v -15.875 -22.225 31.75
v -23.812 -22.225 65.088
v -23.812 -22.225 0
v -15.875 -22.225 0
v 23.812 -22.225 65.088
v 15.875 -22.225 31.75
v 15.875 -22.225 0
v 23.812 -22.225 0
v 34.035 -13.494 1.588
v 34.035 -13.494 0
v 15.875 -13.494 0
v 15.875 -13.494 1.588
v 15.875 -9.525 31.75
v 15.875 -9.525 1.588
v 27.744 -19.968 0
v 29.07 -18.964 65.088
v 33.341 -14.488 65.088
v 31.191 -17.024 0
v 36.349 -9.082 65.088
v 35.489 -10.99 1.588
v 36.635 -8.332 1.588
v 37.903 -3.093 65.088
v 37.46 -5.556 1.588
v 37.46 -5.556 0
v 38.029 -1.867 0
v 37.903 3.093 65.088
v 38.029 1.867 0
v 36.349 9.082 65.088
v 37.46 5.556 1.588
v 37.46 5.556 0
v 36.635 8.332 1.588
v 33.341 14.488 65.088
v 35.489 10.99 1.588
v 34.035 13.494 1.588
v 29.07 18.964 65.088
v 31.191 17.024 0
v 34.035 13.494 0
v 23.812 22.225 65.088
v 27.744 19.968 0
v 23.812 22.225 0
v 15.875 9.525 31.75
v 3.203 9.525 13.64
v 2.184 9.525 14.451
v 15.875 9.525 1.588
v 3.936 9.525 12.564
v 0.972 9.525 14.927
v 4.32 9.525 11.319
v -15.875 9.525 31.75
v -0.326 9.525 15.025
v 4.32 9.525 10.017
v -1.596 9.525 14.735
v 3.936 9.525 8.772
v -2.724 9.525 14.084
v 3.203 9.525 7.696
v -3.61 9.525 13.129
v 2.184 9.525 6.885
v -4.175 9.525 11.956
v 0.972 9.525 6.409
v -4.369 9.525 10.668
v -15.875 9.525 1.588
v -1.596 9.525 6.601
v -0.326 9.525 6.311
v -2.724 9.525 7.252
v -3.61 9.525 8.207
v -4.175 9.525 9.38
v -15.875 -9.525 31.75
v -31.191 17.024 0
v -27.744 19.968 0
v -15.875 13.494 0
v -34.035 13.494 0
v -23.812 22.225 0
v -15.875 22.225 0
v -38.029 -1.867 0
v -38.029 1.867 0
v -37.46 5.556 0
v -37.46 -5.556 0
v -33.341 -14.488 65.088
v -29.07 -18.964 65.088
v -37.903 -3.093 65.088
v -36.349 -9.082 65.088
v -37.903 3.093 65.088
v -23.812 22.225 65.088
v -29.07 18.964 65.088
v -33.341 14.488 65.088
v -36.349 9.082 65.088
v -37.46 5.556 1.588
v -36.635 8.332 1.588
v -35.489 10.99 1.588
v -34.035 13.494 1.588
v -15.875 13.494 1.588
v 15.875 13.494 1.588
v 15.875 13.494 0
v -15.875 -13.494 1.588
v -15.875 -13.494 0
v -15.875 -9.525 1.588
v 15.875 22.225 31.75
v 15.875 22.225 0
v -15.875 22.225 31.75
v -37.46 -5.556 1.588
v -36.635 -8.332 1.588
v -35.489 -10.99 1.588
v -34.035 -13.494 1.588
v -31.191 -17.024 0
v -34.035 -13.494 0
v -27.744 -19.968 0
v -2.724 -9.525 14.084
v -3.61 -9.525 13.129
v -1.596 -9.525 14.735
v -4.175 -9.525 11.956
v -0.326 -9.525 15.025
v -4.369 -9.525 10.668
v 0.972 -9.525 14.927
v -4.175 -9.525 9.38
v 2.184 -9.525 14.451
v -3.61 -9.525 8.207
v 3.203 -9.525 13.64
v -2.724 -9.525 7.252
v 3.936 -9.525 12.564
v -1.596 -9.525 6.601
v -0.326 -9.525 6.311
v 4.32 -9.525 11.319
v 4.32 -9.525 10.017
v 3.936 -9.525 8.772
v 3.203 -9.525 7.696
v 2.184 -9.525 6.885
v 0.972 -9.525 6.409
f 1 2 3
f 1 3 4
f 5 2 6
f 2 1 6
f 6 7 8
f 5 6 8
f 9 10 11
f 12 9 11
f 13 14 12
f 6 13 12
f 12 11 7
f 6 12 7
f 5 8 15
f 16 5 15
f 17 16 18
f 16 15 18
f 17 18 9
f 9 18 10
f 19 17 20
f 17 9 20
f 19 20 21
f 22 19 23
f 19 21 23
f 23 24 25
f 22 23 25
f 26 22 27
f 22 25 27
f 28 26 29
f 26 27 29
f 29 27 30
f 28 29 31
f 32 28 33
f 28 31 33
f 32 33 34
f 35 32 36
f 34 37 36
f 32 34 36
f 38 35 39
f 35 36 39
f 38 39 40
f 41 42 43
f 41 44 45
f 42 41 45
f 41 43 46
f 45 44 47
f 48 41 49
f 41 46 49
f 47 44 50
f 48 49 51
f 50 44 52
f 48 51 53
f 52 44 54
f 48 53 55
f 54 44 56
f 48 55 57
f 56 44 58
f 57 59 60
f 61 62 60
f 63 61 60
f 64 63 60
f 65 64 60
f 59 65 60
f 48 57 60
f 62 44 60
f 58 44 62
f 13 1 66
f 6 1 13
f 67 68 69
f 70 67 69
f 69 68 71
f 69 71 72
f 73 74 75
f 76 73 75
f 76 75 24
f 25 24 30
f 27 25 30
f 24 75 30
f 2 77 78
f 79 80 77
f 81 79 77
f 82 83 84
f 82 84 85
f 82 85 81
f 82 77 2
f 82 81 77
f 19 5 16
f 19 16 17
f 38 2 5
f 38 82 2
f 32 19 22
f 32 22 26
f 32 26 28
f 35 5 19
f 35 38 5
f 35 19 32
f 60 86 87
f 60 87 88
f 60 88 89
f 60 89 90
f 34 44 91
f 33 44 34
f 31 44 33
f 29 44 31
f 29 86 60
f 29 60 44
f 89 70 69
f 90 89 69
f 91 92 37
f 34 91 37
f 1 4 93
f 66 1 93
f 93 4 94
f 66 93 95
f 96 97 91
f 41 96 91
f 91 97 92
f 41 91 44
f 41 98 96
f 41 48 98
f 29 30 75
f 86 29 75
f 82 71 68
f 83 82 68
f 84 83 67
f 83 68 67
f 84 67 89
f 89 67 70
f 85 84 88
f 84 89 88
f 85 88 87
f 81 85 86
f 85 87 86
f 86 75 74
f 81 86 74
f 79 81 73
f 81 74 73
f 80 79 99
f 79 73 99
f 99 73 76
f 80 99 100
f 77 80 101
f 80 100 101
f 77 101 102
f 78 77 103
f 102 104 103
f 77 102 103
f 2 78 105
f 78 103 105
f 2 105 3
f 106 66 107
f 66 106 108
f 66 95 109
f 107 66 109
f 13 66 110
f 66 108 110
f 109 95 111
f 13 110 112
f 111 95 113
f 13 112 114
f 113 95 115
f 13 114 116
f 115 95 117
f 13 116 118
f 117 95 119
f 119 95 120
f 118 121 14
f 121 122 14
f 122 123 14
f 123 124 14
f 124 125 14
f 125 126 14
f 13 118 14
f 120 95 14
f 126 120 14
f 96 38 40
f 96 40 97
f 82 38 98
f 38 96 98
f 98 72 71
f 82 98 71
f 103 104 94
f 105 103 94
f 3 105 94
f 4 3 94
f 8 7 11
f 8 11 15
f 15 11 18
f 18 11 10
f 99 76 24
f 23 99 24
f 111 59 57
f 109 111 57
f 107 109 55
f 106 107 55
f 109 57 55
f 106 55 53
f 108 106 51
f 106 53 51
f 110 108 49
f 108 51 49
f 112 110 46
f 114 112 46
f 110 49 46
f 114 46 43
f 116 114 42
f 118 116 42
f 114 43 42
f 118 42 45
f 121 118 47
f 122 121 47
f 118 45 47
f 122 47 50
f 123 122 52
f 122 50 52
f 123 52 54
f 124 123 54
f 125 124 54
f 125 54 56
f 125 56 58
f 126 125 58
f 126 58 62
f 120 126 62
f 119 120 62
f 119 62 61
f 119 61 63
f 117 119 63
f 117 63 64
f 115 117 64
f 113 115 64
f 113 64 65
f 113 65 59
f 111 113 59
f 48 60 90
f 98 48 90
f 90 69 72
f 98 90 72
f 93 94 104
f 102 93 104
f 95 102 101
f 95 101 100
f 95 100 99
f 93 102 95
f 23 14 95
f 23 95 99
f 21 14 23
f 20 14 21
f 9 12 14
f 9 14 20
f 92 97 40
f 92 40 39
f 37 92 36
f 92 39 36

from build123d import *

# Parameters (mm, degrees)
F1_DEPTH = 65.0875
F2_W     = 31.75
F2_H     = 8.73125
F3_DEPTH = 31.75
F4_DEPTH = 1.5875
F6_D     = 8.7376


with BuildPart() as f1:
    # F0 (on Top) → F1 (new body)
    with BuildSketch(Plane.XY):
        with BuildLine():
            ThreePointArc((-23.8125, 22.225), (-38.1, 0), (-23.8125, -22.225))
            Line((-23.8125, -22.225), (23.8125, -22.225))
            ThreePointArc((23.8125, -22.225), (38.1, 0), (23.8125, 22.225))
            Line((23.8125, 22.225), (-23.8125, 22.225))
        make_face()
    extrude(amount=F1_DEPTH)

    # F2 (on face) → F3 (cut)
    with BuildSketch(Plane(origin=(0, 0, 0), x_dir=(1, 0, 0), z_dir=(0, 0, -1))):
        with Locations((0, 17.859375)):
            Rectangle(F2_W, F2_H)
        Polygon((15.875, 13.49375), (-15.875, 13.49375), (-15.875, 9.525), (0, 9.525), (15.875, 9.525), align=None)
        with Locations((0, -17.859375)):
            Rectangle(F2_W, F2_H)
        Polygon((-15.875, -9.525), (-15.875, -13.49375), (15.875, -13.49375), (15.875, -9.525), (0, -9.525), align=None)
    extrude(amount=-F3_DEPTH, mode=Mode.SUBTRACT)

    # F2 (on face) → F4 (cut)
    with BuildSketch(Plane(origin=(0, 0, 0), x_dir=(1, 0, 0), z_dir=(0, 0, -1))):
        with BuildLine():
            Line((-15.875, 13.49375), (-34.0352272718, 13.49375))
            ThreePointArc((-34.0352272718, 13.49375), (-36.1013811244, 9.6776797674), (-37.4597626742, 5.55625))
            Line((-37.4597626742, 5.55625), (37.4597626742, 5.55625))
            ThreePointArc((37.4597626742, 5.55625), (36.1013811244, 9.6776797674), (34.0352272718, 13.49375))
            Line((34.0352272718, 13.49375), (15.875, 13.49375))
            Line((15.875, 13.49375), (15.875, 9.525))
            Line((15.875, 9.525), (0, 9.525))
            Line((0, 9.525), (-15.875, 9.525))
            Line((-15.875, 9.525), (-15.875, 13.49375))
        make_face()
        with BuildLine():
            Line((37.4597626742, -5.55625), (-37.4597626742, -5.55625))
            ThreePointArc((-37.4597626742, -5.55625), (-36.1013811244, -9.6776797674), (-34.0352272718, -13.49375))
            Line((-34.0352272718, -13.49375), (-15.875, -13.49375))
            Line((-15.875, -13.49375), (-15.875, -9.525))
            Line((-15.875, -9.525), (0, -9.525))
            Line((0, -9.525), (15.875, -9.525))
            Line((15.875, -9.525), (15.875, -13.49375))
            Line((15.875, -13.49375), (34.0352272718, -13.49375))
            ThreePointArc((34.0352272718, -13.49375), (36.1013811244, -9.6776797674), (37.4597626742, -5.55625))
        make_face()
    extrude(amount=-F4_DEPTH, mode=Mode.SUBTRACT)

    # F6 (through all)
    with Locations(Plane.XZ.offset(9.525)):
        with Locations((0, 10.668)):
            Hole(F6_D / 2)


solid = f1.part
